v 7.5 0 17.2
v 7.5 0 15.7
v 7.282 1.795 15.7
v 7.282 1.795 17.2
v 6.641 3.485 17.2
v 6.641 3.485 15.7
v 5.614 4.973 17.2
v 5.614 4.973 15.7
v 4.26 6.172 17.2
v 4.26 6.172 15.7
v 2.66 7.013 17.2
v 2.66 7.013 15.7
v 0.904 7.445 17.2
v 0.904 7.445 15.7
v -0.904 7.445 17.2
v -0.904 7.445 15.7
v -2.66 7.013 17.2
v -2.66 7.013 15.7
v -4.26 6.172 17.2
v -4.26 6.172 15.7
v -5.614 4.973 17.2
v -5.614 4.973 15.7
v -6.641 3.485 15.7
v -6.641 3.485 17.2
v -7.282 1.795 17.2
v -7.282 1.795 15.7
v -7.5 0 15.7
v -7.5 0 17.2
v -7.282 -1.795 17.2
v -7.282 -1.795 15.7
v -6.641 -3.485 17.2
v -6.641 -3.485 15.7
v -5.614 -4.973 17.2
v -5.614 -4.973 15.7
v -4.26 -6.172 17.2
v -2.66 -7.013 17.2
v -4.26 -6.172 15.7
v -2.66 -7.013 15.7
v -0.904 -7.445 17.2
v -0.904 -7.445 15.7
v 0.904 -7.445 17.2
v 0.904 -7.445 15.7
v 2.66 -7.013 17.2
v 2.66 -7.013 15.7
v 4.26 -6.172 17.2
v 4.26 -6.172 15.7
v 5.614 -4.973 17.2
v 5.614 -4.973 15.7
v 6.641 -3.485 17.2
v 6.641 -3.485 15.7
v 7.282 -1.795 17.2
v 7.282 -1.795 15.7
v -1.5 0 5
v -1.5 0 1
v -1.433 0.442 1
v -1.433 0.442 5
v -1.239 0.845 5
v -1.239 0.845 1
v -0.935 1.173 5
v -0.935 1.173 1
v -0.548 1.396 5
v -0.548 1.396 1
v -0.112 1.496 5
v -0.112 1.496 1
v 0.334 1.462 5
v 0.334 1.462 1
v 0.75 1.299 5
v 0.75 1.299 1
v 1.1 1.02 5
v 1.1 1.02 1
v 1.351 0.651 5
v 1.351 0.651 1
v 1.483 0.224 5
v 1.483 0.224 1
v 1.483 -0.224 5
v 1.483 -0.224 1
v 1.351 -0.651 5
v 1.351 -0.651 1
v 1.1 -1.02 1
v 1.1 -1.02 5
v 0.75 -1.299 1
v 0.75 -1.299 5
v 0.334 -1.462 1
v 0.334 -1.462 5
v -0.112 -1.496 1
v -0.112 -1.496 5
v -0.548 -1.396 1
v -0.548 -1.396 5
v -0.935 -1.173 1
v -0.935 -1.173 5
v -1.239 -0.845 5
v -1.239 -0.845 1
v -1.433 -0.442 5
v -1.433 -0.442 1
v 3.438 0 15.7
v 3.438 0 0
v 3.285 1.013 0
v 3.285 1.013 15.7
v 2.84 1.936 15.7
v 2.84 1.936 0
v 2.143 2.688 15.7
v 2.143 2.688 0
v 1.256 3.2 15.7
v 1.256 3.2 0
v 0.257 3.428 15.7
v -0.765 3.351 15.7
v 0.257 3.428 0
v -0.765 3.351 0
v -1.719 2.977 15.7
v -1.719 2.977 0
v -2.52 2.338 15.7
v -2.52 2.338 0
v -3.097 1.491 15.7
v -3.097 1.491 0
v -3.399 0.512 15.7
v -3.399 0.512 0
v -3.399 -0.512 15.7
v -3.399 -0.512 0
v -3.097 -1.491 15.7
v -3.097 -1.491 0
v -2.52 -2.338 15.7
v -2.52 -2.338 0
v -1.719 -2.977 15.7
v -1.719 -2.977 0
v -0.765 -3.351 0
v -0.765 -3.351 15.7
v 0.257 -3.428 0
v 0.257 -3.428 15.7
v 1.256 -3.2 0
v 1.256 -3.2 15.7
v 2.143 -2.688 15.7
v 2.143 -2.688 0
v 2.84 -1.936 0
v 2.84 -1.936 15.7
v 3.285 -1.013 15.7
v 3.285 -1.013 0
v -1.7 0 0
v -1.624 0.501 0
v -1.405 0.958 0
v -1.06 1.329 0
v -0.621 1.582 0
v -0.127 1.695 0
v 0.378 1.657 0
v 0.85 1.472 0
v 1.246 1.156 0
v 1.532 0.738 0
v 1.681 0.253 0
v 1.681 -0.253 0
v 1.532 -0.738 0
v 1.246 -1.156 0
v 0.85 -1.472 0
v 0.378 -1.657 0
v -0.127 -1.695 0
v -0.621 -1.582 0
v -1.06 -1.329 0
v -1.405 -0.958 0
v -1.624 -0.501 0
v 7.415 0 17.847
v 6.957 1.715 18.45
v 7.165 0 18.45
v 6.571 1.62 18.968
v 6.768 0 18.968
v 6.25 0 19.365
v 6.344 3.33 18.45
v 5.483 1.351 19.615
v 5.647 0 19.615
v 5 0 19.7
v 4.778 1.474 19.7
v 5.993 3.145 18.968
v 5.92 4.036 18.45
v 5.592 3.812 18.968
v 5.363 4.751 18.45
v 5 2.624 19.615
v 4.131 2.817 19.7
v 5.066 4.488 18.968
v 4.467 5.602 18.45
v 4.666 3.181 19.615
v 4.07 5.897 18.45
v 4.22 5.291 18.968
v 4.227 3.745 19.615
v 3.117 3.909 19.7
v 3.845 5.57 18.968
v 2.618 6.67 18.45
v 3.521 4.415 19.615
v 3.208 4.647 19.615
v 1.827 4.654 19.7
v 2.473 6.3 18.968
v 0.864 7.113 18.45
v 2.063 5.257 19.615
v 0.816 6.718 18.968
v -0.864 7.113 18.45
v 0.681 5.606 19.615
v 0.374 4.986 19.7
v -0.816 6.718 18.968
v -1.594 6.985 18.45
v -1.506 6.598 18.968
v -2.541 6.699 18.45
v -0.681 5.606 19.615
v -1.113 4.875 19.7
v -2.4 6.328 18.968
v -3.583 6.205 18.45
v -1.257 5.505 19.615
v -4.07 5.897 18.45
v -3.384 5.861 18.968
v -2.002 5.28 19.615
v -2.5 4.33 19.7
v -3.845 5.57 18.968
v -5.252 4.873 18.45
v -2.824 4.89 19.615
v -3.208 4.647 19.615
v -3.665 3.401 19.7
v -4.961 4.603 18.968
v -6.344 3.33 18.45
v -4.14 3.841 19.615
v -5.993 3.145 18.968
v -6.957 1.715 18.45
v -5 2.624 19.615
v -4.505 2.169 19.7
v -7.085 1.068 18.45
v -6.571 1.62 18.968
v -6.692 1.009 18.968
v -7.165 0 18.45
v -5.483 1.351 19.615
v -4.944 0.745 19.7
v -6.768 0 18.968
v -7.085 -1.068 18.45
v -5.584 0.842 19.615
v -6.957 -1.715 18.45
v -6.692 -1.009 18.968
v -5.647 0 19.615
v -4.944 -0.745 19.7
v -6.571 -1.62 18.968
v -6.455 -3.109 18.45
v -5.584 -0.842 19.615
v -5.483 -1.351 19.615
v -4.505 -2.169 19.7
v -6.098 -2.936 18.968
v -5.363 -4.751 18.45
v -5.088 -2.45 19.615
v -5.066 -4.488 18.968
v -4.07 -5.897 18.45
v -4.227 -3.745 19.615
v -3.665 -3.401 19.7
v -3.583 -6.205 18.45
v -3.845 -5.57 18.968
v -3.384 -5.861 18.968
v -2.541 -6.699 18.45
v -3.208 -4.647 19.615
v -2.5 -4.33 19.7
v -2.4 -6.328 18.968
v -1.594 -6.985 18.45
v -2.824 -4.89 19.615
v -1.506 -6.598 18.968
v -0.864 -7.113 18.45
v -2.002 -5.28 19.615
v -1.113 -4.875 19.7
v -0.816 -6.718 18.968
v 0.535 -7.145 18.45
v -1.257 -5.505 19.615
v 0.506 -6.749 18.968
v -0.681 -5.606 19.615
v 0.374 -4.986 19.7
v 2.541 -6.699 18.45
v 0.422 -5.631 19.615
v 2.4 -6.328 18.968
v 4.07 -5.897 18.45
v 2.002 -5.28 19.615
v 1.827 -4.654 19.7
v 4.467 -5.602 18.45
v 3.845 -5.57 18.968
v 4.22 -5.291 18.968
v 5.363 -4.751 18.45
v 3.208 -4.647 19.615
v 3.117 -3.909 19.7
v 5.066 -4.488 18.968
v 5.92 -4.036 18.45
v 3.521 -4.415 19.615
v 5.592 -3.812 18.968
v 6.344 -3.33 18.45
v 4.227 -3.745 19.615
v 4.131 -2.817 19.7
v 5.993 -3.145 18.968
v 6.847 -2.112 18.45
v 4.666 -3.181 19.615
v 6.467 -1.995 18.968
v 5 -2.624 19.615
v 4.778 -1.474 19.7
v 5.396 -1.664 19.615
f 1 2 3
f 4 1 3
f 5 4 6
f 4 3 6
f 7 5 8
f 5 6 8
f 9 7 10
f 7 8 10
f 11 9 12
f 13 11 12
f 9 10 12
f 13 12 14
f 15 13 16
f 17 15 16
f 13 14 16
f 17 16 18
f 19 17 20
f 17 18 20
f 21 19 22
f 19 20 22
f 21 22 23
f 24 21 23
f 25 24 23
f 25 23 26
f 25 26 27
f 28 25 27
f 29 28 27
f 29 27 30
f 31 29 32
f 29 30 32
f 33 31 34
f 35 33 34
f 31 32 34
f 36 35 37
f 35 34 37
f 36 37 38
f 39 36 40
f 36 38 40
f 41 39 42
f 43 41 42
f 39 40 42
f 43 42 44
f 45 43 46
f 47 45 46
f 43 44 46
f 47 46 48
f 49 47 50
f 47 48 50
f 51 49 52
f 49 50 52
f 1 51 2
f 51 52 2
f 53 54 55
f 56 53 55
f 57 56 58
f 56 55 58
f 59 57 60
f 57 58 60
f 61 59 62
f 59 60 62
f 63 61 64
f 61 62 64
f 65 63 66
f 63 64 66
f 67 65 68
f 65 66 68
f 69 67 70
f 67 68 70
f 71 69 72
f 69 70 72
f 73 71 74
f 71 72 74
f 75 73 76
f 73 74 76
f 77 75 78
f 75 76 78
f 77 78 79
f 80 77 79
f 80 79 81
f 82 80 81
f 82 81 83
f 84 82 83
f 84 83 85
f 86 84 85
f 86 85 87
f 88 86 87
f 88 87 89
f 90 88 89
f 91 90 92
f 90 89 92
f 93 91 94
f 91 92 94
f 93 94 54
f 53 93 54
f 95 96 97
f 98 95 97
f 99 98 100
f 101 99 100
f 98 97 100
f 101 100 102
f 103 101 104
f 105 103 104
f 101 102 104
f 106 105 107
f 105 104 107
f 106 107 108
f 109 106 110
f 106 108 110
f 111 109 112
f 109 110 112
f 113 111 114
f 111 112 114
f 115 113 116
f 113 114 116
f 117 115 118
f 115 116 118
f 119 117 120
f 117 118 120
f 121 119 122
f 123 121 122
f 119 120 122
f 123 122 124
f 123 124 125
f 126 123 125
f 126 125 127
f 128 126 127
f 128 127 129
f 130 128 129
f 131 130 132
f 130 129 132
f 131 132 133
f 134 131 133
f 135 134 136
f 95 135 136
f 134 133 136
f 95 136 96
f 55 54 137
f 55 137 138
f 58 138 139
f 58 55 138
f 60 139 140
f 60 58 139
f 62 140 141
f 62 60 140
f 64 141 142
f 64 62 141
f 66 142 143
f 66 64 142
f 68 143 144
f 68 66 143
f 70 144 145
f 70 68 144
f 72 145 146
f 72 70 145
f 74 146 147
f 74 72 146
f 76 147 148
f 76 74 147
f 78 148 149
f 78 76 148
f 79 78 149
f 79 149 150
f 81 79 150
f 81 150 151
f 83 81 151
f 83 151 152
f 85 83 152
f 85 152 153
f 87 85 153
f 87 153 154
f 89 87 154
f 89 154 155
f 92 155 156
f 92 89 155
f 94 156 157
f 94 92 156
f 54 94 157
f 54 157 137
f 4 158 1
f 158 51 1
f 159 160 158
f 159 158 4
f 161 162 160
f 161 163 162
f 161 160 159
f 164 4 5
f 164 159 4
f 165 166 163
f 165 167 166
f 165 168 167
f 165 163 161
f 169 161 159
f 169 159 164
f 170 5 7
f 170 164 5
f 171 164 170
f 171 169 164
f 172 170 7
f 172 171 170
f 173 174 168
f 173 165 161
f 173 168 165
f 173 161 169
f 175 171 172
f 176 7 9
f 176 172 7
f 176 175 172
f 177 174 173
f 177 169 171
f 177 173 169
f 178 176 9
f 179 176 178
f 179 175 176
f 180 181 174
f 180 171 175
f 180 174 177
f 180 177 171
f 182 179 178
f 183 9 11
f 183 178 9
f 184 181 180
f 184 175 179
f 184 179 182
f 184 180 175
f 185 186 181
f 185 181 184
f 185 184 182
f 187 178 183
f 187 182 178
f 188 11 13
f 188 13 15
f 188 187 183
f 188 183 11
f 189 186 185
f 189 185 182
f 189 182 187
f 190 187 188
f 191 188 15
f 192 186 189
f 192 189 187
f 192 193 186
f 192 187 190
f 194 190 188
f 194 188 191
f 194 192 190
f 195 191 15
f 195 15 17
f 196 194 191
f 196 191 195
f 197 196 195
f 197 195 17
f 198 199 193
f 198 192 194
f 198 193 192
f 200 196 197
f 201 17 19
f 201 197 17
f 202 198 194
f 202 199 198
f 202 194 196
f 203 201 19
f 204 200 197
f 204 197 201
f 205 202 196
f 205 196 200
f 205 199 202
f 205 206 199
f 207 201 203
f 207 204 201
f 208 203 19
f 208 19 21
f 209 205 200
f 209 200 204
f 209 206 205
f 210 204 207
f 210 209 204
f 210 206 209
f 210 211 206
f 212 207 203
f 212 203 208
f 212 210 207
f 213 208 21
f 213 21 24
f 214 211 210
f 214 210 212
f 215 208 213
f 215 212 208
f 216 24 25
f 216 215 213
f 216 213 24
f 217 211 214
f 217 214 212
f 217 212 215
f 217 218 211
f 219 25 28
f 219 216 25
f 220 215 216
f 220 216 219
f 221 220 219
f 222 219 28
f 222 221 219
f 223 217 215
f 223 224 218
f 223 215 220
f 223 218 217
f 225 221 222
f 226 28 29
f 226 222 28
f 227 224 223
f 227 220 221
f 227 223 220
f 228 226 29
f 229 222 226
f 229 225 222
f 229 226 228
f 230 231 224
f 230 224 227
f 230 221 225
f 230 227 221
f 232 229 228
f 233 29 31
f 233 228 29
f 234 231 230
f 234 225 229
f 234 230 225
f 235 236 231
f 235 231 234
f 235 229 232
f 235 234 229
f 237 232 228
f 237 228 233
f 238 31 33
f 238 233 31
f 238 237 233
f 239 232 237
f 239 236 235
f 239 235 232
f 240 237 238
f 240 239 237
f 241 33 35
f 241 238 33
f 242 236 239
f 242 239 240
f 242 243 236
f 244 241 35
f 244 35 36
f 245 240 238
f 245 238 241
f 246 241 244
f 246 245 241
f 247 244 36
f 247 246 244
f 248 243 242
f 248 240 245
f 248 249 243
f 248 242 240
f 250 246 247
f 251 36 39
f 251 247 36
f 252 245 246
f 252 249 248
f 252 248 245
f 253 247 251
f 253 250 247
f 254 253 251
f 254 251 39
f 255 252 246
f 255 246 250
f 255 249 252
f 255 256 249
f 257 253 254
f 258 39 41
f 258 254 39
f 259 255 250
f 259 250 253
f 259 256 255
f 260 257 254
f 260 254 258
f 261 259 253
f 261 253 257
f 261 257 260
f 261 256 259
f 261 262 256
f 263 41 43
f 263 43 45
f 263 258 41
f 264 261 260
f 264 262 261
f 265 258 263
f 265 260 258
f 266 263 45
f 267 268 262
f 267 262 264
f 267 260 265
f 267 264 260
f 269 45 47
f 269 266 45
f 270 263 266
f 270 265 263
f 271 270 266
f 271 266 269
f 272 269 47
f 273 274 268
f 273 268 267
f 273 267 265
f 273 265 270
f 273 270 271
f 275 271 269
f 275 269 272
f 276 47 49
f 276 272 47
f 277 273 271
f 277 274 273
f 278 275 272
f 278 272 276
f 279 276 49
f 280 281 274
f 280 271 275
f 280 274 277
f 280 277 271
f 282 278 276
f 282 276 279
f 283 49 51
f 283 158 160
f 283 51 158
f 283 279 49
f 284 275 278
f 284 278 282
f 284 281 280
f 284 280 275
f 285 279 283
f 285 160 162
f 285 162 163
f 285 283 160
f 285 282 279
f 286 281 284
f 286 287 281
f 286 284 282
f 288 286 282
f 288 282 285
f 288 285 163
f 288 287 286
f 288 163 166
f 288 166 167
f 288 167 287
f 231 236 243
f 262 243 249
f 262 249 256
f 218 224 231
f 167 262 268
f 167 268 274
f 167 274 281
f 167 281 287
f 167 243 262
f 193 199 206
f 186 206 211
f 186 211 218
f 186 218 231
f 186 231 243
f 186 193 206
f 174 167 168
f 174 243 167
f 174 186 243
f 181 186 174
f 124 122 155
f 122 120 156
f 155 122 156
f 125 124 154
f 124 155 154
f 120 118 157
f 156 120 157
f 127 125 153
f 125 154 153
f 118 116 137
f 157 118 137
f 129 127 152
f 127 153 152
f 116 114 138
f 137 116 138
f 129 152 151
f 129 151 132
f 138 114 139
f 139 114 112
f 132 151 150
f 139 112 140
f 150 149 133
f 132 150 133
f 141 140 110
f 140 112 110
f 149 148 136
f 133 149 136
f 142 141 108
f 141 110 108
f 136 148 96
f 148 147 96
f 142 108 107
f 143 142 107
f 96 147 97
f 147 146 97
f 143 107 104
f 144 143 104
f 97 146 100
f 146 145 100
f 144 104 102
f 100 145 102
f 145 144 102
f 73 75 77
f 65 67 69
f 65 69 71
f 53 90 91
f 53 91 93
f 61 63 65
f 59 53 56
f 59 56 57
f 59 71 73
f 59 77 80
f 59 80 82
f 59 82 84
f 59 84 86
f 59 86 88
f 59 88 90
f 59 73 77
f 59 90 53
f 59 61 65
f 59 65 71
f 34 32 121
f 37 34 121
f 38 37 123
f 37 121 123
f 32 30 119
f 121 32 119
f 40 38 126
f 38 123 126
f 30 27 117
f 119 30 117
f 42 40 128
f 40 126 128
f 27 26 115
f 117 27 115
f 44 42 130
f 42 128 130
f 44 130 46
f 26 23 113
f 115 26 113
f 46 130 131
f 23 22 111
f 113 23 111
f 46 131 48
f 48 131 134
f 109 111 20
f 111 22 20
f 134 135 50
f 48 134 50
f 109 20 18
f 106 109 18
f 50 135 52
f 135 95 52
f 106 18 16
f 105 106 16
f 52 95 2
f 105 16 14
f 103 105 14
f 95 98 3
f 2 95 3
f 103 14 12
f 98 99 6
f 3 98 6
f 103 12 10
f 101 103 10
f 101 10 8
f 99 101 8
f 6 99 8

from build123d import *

# Parameters (mm, degrees)
SKETCH1_R           = 3.4375
BOSS_EXTRUDE1_DEPTH = 15.7
SKETCH2_R           = 7.5
BOSS_EXTRUDE2_DEPTH = 4
SKETCH3_R           = 1.5
CUT_EXTRUDE1_DEPTH  = 5
CHAMFER1_SIZE       = 0.2
CHAMFER1_SIZE2      = 1
FILLET1_R           = 2.5


with BuildPart() as part:
    # Sketch1 → Boss-Extrude1 (new body)
    with BuildSketch(Plane.XY):
        Circle(SKETCH1_R)
    extrude(amount=BOSS_EXTRUDE1_DEPTH)

    # Sketch2 → Boss-Extrude2 (add)
    with BuildSketch(Plane.XY.offset(15.7)):
        Circle(SKETCH2_R)
    extrude(amount=BOSS_EXTRUDE2_DEPTH)

    # Sketch3 → Cut-Extrude1 (cut)
    with BuildSketch(Plane(origin=(0, 0, 0), x_dir=(-1, 0, 0), z_dir=(0, 0, -1))):
        Circle(SKETCH3_R)
    extrude(amount=-CUT_EXTRUDE1_DEPTH, mode=Mode.SUBTRACT)

    # Chamfer1
    chamfer1_edges = [part.edges().sort_by_distance(p)[0] for p in [
        (1.5, 0, 0),
    ]]
    chamfer1_side = [part.faces().sort_by_distance(p)[0] for p in [
        (-3.340272818, 0, 0),
    ]]
    chamfer(chamfer1_edges, length=CHAMFER1_SIZE, length2=CHAMFER1_SIZE2, reference=chamfer1_side[0])

    # Fillet1
    fillet1_edges = [part.edges().sort_by_distance(p)[0] for p in [
        (-7.5, 0, 19.7),
    ]]
    fillet(fillet1_edges, radius=FILLET1_R)


solid = part.part
